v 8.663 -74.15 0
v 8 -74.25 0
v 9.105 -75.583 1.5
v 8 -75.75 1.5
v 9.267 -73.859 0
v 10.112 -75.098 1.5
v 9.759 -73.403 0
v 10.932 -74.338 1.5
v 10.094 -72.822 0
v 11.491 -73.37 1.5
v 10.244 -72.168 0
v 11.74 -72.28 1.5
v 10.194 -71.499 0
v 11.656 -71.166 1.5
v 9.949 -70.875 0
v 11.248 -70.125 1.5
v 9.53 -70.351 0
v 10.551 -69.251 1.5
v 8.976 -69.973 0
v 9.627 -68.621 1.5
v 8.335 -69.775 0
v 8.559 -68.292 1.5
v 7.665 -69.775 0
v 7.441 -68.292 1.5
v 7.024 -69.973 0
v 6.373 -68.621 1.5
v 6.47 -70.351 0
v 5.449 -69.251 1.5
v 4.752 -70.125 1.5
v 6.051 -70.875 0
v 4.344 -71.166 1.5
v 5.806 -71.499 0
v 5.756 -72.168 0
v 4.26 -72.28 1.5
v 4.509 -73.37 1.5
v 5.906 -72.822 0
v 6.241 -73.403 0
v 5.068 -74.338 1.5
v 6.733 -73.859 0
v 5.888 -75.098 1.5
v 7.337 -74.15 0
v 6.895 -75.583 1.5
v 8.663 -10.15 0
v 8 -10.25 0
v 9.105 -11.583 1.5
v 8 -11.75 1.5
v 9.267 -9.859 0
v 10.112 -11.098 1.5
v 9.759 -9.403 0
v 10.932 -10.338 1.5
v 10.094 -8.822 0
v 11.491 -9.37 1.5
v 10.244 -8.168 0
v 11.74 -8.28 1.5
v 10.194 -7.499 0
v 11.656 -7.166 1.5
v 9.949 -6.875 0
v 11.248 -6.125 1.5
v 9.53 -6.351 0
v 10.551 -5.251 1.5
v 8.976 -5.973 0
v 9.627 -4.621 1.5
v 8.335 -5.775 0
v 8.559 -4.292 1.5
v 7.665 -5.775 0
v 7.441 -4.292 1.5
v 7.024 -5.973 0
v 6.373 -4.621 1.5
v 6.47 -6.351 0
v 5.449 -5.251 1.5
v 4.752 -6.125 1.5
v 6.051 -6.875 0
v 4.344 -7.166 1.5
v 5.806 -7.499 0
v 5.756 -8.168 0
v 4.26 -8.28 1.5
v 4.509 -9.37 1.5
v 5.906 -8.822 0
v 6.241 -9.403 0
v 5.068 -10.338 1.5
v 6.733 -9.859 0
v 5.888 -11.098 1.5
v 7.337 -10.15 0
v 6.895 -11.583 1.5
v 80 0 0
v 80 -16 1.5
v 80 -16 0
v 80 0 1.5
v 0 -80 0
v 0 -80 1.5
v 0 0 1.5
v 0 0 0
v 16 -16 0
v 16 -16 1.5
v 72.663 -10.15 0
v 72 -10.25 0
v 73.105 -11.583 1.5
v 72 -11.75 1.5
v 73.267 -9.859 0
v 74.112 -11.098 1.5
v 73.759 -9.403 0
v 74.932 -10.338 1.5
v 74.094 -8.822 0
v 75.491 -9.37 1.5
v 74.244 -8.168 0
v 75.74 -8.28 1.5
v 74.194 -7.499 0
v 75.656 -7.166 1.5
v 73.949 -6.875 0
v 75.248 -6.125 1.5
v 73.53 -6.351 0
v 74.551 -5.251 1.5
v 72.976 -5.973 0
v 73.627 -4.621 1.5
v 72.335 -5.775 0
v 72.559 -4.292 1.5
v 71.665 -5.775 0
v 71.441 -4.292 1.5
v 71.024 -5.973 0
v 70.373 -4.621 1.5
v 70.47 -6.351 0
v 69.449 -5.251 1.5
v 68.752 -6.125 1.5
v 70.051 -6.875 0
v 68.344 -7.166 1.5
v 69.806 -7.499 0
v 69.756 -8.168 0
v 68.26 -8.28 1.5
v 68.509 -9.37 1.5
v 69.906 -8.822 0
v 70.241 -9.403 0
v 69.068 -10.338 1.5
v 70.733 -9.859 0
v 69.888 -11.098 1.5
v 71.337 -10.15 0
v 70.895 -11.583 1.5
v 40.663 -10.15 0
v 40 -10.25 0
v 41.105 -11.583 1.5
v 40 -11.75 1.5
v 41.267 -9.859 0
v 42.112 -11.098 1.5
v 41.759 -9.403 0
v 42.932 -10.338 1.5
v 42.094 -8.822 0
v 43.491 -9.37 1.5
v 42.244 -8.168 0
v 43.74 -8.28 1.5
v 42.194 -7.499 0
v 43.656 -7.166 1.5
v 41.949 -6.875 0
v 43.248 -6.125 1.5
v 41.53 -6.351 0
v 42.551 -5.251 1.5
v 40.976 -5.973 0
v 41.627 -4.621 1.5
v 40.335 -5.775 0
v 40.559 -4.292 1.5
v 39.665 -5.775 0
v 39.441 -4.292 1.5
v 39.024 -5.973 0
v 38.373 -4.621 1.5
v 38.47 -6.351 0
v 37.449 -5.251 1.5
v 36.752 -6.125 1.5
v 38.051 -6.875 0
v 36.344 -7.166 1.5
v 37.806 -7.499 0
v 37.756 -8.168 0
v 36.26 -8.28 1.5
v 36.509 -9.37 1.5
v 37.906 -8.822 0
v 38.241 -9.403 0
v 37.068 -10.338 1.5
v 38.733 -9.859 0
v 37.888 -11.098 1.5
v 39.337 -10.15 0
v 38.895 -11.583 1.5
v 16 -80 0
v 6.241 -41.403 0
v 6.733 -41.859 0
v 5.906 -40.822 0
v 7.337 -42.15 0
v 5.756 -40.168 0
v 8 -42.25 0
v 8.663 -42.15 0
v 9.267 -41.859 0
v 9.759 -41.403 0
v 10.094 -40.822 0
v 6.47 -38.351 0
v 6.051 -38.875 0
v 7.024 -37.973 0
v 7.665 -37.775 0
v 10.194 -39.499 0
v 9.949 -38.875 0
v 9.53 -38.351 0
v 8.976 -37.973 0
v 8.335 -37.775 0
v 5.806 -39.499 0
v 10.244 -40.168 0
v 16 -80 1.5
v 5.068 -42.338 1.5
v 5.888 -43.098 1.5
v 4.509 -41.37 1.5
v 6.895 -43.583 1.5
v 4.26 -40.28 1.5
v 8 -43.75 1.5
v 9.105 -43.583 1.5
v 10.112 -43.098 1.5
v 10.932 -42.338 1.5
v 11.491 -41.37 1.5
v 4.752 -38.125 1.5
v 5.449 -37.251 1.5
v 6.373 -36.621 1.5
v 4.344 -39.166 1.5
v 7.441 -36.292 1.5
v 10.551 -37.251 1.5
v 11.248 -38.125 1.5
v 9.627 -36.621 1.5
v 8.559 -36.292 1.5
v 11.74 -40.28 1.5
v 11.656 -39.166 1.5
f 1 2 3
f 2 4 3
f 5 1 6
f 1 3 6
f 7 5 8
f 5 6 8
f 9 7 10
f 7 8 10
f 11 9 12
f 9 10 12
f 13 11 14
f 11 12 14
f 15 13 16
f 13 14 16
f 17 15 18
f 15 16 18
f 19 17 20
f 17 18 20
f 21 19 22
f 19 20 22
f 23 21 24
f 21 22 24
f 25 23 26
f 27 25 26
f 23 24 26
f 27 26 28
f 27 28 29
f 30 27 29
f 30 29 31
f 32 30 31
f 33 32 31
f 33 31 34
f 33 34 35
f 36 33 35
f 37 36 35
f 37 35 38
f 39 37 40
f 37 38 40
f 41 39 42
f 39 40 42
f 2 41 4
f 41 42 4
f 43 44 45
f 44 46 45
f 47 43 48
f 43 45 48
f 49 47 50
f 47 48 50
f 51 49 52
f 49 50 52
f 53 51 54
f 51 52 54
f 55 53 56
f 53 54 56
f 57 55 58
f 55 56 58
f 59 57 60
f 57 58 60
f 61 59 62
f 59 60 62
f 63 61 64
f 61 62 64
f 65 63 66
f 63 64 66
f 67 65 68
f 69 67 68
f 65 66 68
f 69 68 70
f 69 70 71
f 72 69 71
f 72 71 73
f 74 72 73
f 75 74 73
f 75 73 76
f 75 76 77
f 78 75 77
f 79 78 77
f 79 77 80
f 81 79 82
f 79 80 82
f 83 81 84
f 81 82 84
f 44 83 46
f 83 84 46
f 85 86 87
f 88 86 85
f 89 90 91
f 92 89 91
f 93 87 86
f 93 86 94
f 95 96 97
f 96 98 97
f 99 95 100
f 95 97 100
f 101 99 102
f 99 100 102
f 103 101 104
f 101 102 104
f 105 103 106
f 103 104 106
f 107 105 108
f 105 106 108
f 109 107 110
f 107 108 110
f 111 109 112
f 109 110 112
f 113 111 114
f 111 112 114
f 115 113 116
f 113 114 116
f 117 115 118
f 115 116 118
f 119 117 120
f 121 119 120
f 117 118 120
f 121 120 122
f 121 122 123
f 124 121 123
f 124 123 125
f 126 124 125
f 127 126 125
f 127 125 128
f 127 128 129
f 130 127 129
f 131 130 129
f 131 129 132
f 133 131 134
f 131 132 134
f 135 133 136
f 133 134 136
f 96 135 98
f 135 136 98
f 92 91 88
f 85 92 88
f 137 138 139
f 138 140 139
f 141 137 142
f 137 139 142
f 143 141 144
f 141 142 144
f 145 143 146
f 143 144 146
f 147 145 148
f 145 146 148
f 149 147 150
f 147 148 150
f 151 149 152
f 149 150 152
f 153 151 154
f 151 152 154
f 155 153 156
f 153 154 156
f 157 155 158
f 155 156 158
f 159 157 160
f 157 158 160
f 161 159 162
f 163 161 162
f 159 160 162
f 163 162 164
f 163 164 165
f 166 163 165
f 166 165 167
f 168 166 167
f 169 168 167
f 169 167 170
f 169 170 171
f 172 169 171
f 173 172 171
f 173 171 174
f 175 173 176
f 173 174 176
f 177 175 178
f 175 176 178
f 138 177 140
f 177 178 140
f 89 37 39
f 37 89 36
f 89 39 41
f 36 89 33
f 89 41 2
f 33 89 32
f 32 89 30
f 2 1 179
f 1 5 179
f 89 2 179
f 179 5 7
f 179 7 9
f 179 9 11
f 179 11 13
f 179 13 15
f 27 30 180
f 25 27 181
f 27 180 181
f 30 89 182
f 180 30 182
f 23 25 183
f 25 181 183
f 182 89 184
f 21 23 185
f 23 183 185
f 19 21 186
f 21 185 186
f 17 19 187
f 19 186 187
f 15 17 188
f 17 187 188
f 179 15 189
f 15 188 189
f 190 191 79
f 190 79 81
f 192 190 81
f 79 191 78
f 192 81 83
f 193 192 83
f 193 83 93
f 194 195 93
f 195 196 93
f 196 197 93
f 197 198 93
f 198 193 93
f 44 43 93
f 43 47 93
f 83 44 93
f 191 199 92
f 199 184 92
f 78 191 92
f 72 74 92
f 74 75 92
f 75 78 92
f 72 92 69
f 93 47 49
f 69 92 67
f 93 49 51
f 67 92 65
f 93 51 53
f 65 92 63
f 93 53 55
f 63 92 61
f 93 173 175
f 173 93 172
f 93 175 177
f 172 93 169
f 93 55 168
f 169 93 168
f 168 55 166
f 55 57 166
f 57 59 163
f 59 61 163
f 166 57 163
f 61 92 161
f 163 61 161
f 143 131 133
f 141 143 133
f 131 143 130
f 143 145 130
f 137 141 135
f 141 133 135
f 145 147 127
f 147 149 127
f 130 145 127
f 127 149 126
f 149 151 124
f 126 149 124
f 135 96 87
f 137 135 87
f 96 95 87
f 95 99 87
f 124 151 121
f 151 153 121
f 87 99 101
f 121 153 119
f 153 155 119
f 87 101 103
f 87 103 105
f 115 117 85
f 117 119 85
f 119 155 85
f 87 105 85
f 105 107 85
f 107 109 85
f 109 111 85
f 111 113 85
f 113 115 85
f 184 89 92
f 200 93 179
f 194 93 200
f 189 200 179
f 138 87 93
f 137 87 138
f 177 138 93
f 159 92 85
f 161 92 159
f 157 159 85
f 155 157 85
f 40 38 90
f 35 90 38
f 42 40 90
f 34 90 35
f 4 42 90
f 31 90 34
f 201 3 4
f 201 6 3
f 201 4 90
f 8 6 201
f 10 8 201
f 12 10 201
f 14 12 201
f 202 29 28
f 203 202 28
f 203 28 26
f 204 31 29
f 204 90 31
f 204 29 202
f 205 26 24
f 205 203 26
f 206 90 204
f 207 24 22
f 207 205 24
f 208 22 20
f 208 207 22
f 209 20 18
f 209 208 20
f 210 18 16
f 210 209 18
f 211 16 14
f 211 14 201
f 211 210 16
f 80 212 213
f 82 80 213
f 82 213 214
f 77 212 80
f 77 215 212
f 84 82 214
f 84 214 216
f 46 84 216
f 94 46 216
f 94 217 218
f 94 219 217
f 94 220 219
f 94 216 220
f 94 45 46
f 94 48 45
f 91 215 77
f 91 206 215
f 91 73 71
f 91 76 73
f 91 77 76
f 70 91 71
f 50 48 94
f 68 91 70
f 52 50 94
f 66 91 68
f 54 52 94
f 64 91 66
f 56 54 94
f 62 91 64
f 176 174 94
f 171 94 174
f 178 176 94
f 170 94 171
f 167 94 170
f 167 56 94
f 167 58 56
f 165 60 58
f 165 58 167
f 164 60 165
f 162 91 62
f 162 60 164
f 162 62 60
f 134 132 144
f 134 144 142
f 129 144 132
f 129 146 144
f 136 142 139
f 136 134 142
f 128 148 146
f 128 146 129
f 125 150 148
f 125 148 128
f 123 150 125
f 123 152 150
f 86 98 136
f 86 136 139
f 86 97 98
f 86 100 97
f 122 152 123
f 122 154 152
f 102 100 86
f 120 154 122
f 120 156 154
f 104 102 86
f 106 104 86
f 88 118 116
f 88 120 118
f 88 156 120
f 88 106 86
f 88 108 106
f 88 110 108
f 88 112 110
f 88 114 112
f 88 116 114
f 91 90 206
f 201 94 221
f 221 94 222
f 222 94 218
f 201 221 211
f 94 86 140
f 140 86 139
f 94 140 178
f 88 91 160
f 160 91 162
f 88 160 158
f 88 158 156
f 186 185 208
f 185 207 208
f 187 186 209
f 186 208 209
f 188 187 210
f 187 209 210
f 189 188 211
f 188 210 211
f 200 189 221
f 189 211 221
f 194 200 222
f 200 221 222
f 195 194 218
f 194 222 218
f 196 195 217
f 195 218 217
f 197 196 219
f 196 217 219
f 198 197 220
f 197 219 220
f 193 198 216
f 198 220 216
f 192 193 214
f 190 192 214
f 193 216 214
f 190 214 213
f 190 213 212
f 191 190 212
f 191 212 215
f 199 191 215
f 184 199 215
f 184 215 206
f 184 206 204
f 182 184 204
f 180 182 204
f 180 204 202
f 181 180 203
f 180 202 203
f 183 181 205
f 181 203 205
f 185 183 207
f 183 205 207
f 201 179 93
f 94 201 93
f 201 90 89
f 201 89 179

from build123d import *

# Parameters (mm, degrees)
SKETCH1_W           = 80
SKETCH1_H           = 80
BOSS_EXTRUDE1_DEPTH = 1.5
SKETCH2_W           = 64
SKETCH2_H           = 64
CUT_EXTRUDE1_DEPTH  = 2.5
HOLE1_AT_2_COUNT    = 2
HOLE1_AT_2_PITCH    = 32
HOLE1_AT_3_COUNT    = 2
HOLE1_AT_3_PITCH    = 64
HOLE1_AT_4_COUNT    = 2
HOLE1_AT_4_PITCH    = 32
HOLE1_AT_5_COUNT    = 2
HOLE1_AT_5_PITCH    = 64


with BuildPart() as part:
    # Sketch1 → Boss-Extrude1 (new body)
    with BuildSketch(Plane.XY.offset(1.5)):
        with Locations((40, -40)):
            Rectangle(SKETCH1_W, SKETCH1_H)
    extrude(amount=-BOSS_EXTRUDE1_DEPTH)

    # Sketch2 → Cut-Extrude1 (cut, through all)
    with BuildSketch(Plane(origin=(0, 0, 0), x_dir=(-1, 0, 0), z_dir=(0, 0, -1))):
        with Locations((-48, -48)):
            Rectangle(SKETCH2_W, SKETCH2_H)
    extrude(amount=-CUT_EXTRUDE1_DEPTH, mode=Mode.SUBTRACT)

    # Sketch3 → Hole1 (revolve, cut)
    with BuildSketch(Plane(origin=(8, -8, 1.5), x_dir=(0, -1, 0), z_dir=(1, 0, 0))):
        Polygon((0, 0), (0, 1.5), (2.25, 1.5), (3.75, 0), align=None)
    hole1 = revolve(axis=Axis((8, -8, -108.5), (0, 0, 1)), mode=Mode.SUBTRACT)

    # Hole1 at 2: Hole1 ×2
    with Locations(*[(i * HOLE1_AT_2_PITCH, 0, 0) for i in range(1, HOLE1_AT_2_COUNT)]):
        add(hole1, mode=Mode.SUBTRACT)

    # Hole1 at 3: Hole1 ×2
    with Locations(*[(i * HOLE1_AT_3_PITCH, 0, 0) for i in range(1, HOLE1_AT_3_COUNT)]):
        add(hole1, mode=Mode.SUBTRACT)

    # Hole1 at 4: Hole1 ×2
    with Locations(*[(0, -i * HOLE1_AT_4_PITCH, 0) for i in range(1, HOLE1_AT_4_COUNT)]):
        add(hole1, mode=Mode.SUBTRACT)

    # Hole1 at 5: Hole1 ×2
    with Locations(*[(0, -i * HOLE1_AT_5_PITCH, 0) for i in range(1, HOLE1_AT_5_COUNT)]):
        add(hole1, mode=Mode.SUBTRACT)


solid = part.part
